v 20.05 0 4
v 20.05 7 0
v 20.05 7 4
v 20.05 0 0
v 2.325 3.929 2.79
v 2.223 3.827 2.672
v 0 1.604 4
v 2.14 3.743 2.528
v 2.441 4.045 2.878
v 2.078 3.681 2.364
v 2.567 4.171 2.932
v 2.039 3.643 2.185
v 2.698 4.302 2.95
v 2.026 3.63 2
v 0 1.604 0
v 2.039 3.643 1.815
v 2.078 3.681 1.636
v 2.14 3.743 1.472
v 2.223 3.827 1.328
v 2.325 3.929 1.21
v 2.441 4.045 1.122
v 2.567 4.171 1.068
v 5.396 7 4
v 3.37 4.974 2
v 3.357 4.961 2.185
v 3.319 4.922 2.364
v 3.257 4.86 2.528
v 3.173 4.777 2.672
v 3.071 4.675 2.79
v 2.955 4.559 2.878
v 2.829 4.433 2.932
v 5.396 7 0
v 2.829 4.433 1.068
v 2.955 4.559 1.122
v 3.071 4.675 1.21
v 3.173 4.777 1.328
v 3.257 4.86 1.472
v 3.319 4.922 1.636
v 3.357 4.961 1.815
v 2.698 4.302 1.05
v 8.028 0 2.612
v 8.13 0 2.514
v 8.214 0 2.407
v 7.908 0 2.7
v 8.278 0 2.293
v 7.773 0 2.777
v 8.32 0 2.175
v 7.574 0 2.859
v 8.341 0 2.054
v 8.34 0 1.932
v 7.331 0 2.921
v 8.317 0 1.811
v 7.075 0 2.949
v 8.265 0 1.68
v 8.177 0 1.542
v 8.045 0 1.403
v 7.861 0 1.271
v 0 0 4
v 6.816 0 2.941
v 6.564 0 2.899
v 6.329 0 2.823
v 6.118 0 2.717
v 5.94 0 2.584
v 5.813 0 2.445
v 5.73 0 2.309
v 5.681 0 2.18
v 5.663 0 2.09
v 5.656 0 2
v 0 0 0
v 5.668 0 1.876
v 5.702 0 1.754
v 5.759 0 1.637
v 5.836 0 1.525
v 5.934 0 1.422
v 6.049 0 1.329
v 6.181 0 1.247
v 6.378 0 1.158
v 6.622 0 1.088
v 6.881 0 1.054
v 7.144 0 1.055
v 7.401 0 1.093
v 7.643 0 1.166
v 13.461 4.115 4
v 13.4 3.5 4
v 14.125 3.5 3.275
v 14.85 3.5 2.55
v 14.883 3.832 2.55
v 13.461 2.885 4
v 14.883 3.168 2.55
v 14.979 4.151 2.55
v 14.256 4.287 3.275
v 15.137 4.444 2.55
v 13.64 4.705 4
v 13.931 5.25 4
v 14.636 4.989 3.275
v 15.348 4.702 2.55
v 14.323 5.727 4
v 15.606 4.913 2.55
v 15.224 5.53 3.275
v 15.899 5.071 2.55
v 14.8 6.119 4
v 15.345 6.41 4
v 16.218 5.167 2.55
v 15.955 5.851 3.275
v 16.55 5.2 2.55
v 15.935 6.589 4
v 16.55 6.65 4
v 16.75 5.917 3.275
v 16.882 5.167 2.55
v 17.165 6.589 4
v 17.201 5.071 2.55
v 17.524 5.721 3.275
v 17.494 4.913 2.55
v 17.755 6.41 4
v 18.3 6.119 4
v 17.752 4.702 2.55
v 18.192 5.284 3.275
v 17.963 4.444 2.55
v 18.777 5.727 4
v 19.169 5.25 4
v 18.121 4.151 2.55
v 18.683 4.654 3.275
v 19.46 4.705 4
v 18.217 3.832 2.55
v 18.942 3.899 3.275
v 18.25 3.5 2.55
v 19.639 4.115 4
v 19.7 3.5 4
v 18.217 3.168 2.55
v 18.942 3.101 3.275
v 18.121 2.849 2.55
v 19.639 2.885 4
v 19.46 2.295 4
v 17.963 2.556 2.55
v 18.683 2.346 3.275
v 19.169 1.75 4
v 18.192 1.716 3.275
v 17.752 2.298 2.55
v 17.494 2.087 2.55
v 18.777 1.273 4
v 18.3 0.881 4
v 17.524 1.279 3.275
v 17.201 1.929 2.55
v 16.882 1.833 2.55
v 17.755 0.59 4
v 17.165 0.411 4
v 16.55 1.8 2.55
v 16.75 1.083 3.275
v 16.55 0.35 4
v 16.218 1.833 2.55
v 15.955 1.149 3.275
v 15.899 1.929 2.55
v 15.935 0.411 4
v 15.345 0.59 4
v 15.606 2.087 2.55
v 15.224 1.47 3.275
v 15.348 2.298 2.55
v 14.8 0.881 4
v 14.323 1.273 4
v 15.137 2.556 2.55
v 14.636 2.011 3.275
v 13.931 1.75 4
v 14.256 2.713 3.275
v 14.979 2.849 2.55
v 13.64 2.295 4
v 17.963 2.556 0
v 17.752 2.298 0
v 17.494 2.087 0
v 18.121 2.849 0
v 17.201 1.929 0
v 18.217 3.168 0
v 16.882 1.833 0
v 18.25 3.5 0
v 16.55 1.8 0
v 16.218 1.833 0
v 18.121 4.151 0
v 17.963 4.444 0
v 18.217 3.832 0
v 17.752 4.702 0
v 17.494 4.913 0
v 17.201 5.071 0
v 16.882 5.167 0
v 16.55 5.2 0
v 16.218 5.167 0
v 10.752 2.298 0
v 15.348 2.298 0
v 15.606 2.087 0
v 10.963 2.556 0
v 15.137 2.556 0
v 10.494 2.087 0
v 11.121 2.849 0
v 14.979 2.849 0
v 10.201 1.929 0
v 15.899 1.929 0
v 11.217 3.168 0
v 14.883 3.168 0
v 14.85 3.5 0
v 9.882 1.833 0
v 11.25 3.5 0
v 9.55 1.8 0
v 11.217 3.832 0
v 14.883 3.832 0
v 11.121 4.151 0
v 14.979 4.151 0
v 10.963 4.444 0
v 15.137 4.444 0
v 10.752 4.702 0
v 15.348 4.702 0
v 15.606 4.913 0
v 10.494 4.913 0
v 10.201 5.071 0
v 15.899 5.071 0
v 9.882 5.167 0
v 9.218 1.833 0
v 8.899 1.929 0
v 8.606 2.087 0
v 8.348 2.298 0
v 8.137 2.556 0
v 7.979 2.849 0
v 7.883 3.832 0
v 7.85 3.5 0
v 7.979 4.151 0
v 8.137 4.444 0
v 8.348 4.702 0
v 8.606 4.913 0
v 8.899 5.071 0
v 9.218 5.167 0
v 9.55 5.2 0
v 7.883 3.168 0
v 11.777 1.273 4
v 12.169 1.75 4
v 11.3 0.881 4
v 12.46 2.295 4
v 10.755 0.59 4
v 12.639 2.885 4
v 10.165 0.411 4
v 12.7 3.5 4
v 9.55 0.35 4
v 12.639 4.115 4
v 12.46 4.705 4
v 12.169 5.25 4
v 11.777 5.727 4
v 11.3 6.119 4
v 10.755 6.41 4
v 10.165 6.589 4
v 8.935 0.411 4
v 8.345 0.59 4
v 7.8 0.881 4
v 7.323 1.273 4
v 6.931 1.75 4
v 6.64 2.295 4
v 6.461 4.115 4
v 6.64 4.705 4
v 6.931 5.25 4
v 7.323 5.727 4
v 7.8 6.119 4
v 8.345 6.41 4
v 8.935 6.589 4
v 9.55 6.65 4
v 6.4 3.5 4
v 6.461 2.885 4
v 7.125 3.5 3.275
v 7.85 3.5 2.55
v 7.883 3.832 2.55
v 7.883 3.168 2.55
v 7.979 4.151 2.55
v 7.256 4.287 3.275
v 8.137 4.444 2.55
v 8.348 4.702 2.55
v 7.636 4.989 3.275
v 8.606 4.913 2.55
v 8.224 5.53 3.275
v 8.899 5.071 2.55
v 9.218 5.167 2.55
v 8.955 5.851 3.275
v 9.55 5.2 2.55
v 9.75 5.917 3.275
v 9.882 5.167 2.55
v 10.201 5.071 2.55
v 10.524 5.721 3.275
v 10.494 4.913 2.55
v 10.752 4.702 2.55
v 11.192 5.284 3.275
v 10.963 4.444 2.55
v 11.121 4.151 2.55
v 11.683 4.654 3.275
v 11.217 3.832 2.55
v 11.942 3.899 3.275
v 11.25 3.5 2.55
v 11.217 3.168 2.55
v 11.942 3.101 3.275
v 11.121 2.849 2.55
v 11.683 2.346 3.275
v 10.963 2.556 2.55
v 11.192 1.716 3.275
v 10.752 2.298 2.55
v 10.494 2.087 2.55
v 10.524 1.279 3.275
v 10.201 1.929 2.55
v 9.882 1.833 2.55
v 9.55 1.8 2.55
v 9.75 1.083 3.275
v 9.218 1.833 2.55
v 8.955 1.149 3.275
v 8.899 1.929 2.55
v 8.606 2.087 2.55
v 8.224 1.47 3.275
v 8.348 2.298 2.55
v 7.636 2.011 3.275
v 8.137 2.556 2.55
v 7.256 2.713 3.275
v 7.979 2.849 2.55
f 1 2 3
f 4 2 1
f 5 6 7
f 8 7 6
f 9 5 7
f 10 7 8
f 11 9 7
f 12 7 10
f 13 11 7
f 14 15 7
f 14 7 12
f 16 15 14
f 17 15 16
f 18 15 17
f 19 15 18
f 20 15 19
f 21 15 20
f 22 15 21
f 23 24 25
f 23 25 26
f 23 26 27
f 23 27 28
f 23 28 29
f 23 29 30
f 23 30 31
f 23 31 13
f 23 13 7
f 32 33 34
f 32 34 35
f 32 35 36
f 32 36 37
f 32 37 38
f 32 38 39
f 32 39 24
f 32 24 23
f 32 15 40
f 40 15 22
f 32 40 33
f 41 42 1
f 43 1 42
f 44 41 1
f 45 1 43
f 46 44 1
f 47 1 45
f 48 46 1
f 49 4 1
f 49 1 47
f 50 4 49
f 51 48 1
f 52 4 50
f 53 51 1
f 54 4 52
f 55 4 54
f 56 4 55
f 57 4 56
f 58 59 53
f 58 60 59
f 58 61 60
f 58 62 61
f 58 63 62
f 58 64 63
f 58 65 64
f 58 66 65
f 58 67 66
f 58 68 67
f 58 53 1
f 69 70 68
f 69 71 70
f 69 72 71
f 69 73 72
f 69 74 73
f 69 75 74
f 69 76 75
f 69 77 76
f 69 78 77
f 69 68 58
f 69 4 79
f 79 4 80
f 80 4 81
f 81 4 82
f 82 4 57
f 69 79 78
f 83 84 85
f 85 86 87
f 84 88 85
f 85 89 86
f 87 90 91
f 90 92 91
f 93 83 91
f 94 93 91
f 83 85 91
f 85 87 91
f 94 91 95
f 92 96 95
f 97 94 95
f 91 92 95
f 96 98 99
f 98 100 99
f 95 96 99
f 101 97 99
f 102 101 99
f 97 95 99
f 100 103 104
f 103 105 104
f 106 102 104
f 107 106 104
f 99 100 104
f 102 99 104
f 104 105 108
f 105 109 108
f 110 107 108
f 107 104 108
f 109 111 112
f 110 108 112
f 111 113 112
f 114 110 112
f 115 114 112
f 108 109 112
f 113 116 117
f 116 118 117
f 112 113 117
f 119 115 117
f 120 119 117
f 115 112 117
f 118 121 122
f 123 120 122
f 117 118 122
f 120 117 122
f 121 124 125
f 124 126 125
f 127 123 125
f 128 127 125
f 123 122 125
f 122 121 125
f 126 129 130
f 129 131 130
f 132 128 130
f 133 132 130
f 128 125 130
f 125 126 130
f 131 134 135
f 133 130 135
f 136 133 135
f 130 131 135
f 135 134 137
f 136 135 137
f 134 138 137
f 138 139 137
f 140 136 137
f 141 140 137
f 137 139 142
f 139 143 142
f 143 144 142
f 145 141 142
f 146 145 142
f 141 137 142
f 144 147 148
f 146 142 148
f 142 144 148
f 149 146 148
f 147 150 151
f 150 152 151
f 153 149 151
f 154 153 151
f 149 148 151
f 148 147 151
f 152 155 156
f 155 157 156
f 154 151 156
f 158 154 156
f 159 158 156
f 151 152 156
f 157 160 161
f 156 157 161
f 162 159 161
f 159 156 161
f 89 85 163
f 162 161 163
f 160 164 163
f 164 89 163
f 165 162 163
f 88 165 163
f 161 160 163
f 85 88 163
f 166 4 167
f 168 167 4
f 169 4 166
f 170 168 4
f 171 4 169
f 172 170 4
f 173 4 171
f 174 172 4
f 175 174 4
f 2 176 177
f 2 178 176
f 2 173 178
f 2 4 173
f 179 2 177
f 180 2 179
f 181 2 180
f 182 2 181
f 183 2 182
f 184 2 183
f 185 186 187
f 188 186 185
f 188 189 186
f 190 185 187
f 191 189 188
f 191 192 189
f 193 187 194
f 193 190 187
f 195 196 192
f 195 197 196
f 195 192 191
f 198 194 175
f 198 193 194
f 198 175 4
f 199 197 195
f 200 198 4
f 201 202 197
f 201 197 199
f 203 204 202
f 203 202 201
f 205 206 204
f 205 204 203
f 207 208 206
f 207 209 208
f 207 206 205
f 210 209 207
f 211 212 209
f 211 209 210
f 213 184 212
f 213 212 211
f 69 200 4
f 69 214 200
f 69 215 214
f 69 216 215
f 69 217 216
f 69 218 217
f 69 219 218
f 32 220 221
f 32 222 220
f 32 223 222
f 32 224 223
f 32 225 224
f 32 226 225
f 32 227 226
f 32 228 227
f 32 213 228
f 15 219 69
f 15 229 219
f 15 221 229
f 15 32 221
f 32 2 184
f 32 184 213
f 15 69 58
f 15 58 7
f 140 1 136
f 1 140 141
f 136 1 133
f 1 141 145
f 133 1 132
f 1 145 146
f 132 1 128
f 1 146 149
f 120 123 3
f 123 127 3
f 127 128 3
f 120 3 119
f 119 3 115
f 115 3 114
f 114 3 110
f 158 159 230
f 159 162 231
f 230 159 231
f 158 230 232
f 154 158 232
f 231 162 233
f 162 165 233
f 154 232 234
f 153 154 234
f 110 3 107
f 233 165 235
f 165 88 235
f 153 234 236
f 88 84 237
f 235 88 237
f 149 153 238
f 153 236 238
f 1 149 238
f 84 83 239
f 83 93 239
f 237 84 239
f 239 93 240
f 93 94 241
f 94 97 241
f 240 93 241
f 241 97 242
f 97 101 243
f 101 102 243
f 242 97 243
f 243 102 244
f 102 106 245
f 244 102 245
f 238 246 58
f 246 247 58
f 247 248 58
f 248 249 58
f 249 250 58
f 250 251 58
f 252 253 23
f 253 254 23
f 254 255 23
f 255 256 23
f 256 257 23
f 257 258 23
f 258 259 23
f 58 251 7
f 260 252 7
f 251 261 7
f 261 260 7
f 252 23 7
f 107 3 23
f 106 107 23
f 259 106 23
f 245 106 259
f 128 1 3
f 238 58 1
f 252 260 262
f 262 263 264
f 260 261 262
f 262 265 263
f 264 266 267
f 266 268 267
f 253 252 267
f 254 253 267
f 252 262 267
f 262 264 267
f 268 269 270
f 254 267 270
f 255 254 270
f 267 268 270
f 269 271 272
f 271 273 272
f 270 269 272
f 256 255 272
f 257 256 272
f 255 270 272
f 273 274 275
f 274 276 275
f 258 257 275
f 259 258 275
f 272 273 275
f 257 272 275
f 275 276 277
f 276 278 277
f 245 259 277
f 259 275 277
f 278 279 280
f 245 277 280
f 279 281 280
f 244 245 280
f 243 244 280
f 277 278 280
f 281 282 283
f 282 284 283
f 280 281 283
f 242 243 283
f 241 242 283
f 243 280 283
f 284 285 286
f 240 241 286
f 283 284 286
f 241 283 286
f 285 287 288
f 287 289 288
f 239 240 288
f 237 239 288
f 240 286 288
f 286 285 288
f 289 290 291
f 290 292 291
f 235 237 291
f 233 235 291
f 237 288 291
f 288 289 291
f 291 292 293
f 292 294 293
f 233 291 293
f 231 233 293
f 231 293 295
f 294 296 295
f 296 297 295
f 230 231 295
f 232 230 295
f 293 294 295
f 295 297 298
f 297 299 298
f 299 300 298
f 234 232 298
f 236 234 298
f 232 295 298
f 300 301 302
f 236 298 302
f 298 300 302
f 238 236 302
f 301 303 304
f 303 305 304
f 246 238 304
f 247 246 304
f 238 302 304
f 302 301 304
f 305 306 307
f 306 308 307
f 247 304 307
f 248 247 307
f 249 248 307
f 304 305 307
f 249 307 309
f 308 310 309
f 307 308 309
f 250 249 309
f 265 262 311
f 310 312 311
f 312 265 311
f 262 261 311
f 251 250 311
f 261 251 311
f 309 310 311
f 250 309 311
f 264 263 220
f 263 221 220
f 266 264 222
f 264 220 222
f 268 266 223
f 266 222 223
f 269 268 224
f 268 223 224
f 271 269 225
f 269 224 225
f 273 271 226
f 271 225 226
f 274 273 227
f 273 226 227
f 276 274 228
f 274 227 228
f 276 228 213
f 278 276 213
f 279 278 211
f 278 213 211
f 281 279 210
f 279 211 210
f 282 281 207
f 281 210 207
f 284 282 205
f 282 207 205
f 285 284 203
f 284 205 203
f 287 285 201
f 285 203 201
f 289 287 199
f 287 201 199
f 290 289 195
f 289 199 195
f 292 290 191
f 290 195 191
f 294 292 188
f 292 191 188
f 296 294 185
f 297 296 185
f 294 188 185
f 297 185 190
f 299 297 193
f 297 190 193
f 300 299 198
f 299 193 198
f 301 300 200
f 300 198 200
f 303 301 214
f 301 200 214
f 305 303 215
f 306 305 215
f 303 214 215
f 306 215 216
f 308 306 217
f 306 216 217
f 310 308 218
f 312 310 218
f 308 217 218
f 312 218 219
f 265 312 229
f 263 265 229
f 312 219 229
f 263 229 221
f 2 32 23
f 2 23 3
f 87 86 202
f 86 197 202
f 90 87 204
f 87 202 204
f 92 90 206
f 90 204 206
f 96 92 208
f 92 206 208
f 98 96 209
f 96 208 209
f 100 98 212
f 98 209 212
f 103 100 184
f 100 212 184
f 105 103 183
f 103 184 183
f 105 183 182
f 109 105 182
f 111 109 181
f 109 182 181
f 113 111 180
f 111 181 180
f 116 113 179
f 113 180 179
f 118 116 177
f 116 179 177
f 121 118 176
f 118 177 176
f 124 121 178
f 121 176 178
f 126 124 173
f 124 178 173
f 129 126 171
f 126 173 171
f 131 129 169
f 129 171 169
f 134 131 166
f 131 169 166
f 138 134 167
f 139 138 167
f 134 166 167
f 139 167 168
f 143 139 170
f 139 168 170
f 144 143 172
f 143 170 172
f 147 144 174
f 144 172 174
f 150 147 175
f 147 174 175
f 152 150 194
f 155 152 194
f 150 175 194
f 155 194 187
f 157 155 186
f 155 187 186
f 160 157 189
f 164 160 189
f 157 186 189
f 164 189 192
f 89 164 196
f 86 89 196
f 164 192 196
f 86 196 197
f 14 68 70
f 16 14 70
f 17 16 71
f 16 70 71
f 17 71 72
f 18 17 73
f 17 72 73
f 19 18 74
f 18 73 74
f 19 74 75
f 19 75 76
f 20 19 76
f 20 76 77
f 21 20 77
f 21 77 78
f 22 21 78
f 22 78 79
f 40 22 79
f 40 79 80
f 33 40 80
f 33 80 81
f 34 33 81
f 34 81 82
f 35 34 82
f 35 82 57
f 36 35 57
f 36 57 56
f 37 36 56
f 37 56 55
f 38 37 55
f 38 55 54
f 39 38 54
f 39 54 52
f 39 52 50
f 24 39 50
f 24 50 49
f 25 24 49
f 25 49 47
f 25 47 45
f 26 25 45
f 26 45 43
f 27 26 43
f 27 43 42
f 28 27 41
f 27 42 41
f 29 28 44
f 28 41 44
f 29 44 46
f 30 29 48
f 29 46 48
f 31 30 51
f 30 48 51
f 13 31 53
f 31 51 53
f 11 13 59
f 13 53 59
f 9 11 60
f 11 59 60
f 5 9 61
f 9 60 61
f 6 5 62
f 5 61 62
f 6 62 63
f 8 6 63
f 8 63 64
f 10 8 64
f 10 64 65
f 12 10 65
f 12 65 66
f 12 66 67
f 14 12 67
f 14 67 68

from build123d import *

# Parameters (mm, degrees)
BOSS_EXTRUDE1_DEPTH                                 = 4
CSK_FOR_M3_COUNTERSUNK_FLAT_HEAD_SCREW1_D           = 3.4
CSK_FOR_M3_COUNTERSUNK_FLAT_HEAD_SCREW1_CSINK_D     = 6.3
CSK_FOR_M3_COUNTERSUNK_FLAT_HEAD_SCREW1_CSINK_ANGLE = 90
TAP_DRILL_FOR_M2_TAP1_D                             = 1.9


with BuildPart() as part:
    # Sketch1 → Boss-Extrude1 (new body)
    with BuildSketch(Plane.XY):
        Polygon((5.396358967, 7), (20.05, 7), (20.05, 0), (0, 0), (0, 1.603641033), align=None)
    extrude(amount=BOSS_EXTRUDE1_DEPTH)

    # CSK for M3 Countersunk Flat Head Screw1 (through all)
    with Locations(Plane.XY.offset(4)):
        with Locations((16.55, 3.5), (9.55, 3.5)):
            CounterSinkHole(CSK_FOR_M3_COUNTERSUNK_FLAT_HEAD_SCREW1_D / 2, CSK_FOR_M3_COUNTERSUNK_FLAT_HEAD_SCREW1_CSINK_D / 2, counter_sink_angle=CSK_FOR_M3_COUNTERSUNK_FLAT_HEAD_SCREW1_CSINK_ANGLE)

    # Tap Drill for M2 Tap1 (through all)
    with Locations(Plane(origin=(-0.801820516, 0.801820516, 0), x_dir=(0.7071067811865511, 0.707106781186544, 0), z_dir=(-0.707106781186544, 0.7071067811865511, 0))):
        with Locations((4.949747468, -2)):
            Hole(TAP_DRILL_FOR_M2_TAP1_D / 2)


solid = part.part
